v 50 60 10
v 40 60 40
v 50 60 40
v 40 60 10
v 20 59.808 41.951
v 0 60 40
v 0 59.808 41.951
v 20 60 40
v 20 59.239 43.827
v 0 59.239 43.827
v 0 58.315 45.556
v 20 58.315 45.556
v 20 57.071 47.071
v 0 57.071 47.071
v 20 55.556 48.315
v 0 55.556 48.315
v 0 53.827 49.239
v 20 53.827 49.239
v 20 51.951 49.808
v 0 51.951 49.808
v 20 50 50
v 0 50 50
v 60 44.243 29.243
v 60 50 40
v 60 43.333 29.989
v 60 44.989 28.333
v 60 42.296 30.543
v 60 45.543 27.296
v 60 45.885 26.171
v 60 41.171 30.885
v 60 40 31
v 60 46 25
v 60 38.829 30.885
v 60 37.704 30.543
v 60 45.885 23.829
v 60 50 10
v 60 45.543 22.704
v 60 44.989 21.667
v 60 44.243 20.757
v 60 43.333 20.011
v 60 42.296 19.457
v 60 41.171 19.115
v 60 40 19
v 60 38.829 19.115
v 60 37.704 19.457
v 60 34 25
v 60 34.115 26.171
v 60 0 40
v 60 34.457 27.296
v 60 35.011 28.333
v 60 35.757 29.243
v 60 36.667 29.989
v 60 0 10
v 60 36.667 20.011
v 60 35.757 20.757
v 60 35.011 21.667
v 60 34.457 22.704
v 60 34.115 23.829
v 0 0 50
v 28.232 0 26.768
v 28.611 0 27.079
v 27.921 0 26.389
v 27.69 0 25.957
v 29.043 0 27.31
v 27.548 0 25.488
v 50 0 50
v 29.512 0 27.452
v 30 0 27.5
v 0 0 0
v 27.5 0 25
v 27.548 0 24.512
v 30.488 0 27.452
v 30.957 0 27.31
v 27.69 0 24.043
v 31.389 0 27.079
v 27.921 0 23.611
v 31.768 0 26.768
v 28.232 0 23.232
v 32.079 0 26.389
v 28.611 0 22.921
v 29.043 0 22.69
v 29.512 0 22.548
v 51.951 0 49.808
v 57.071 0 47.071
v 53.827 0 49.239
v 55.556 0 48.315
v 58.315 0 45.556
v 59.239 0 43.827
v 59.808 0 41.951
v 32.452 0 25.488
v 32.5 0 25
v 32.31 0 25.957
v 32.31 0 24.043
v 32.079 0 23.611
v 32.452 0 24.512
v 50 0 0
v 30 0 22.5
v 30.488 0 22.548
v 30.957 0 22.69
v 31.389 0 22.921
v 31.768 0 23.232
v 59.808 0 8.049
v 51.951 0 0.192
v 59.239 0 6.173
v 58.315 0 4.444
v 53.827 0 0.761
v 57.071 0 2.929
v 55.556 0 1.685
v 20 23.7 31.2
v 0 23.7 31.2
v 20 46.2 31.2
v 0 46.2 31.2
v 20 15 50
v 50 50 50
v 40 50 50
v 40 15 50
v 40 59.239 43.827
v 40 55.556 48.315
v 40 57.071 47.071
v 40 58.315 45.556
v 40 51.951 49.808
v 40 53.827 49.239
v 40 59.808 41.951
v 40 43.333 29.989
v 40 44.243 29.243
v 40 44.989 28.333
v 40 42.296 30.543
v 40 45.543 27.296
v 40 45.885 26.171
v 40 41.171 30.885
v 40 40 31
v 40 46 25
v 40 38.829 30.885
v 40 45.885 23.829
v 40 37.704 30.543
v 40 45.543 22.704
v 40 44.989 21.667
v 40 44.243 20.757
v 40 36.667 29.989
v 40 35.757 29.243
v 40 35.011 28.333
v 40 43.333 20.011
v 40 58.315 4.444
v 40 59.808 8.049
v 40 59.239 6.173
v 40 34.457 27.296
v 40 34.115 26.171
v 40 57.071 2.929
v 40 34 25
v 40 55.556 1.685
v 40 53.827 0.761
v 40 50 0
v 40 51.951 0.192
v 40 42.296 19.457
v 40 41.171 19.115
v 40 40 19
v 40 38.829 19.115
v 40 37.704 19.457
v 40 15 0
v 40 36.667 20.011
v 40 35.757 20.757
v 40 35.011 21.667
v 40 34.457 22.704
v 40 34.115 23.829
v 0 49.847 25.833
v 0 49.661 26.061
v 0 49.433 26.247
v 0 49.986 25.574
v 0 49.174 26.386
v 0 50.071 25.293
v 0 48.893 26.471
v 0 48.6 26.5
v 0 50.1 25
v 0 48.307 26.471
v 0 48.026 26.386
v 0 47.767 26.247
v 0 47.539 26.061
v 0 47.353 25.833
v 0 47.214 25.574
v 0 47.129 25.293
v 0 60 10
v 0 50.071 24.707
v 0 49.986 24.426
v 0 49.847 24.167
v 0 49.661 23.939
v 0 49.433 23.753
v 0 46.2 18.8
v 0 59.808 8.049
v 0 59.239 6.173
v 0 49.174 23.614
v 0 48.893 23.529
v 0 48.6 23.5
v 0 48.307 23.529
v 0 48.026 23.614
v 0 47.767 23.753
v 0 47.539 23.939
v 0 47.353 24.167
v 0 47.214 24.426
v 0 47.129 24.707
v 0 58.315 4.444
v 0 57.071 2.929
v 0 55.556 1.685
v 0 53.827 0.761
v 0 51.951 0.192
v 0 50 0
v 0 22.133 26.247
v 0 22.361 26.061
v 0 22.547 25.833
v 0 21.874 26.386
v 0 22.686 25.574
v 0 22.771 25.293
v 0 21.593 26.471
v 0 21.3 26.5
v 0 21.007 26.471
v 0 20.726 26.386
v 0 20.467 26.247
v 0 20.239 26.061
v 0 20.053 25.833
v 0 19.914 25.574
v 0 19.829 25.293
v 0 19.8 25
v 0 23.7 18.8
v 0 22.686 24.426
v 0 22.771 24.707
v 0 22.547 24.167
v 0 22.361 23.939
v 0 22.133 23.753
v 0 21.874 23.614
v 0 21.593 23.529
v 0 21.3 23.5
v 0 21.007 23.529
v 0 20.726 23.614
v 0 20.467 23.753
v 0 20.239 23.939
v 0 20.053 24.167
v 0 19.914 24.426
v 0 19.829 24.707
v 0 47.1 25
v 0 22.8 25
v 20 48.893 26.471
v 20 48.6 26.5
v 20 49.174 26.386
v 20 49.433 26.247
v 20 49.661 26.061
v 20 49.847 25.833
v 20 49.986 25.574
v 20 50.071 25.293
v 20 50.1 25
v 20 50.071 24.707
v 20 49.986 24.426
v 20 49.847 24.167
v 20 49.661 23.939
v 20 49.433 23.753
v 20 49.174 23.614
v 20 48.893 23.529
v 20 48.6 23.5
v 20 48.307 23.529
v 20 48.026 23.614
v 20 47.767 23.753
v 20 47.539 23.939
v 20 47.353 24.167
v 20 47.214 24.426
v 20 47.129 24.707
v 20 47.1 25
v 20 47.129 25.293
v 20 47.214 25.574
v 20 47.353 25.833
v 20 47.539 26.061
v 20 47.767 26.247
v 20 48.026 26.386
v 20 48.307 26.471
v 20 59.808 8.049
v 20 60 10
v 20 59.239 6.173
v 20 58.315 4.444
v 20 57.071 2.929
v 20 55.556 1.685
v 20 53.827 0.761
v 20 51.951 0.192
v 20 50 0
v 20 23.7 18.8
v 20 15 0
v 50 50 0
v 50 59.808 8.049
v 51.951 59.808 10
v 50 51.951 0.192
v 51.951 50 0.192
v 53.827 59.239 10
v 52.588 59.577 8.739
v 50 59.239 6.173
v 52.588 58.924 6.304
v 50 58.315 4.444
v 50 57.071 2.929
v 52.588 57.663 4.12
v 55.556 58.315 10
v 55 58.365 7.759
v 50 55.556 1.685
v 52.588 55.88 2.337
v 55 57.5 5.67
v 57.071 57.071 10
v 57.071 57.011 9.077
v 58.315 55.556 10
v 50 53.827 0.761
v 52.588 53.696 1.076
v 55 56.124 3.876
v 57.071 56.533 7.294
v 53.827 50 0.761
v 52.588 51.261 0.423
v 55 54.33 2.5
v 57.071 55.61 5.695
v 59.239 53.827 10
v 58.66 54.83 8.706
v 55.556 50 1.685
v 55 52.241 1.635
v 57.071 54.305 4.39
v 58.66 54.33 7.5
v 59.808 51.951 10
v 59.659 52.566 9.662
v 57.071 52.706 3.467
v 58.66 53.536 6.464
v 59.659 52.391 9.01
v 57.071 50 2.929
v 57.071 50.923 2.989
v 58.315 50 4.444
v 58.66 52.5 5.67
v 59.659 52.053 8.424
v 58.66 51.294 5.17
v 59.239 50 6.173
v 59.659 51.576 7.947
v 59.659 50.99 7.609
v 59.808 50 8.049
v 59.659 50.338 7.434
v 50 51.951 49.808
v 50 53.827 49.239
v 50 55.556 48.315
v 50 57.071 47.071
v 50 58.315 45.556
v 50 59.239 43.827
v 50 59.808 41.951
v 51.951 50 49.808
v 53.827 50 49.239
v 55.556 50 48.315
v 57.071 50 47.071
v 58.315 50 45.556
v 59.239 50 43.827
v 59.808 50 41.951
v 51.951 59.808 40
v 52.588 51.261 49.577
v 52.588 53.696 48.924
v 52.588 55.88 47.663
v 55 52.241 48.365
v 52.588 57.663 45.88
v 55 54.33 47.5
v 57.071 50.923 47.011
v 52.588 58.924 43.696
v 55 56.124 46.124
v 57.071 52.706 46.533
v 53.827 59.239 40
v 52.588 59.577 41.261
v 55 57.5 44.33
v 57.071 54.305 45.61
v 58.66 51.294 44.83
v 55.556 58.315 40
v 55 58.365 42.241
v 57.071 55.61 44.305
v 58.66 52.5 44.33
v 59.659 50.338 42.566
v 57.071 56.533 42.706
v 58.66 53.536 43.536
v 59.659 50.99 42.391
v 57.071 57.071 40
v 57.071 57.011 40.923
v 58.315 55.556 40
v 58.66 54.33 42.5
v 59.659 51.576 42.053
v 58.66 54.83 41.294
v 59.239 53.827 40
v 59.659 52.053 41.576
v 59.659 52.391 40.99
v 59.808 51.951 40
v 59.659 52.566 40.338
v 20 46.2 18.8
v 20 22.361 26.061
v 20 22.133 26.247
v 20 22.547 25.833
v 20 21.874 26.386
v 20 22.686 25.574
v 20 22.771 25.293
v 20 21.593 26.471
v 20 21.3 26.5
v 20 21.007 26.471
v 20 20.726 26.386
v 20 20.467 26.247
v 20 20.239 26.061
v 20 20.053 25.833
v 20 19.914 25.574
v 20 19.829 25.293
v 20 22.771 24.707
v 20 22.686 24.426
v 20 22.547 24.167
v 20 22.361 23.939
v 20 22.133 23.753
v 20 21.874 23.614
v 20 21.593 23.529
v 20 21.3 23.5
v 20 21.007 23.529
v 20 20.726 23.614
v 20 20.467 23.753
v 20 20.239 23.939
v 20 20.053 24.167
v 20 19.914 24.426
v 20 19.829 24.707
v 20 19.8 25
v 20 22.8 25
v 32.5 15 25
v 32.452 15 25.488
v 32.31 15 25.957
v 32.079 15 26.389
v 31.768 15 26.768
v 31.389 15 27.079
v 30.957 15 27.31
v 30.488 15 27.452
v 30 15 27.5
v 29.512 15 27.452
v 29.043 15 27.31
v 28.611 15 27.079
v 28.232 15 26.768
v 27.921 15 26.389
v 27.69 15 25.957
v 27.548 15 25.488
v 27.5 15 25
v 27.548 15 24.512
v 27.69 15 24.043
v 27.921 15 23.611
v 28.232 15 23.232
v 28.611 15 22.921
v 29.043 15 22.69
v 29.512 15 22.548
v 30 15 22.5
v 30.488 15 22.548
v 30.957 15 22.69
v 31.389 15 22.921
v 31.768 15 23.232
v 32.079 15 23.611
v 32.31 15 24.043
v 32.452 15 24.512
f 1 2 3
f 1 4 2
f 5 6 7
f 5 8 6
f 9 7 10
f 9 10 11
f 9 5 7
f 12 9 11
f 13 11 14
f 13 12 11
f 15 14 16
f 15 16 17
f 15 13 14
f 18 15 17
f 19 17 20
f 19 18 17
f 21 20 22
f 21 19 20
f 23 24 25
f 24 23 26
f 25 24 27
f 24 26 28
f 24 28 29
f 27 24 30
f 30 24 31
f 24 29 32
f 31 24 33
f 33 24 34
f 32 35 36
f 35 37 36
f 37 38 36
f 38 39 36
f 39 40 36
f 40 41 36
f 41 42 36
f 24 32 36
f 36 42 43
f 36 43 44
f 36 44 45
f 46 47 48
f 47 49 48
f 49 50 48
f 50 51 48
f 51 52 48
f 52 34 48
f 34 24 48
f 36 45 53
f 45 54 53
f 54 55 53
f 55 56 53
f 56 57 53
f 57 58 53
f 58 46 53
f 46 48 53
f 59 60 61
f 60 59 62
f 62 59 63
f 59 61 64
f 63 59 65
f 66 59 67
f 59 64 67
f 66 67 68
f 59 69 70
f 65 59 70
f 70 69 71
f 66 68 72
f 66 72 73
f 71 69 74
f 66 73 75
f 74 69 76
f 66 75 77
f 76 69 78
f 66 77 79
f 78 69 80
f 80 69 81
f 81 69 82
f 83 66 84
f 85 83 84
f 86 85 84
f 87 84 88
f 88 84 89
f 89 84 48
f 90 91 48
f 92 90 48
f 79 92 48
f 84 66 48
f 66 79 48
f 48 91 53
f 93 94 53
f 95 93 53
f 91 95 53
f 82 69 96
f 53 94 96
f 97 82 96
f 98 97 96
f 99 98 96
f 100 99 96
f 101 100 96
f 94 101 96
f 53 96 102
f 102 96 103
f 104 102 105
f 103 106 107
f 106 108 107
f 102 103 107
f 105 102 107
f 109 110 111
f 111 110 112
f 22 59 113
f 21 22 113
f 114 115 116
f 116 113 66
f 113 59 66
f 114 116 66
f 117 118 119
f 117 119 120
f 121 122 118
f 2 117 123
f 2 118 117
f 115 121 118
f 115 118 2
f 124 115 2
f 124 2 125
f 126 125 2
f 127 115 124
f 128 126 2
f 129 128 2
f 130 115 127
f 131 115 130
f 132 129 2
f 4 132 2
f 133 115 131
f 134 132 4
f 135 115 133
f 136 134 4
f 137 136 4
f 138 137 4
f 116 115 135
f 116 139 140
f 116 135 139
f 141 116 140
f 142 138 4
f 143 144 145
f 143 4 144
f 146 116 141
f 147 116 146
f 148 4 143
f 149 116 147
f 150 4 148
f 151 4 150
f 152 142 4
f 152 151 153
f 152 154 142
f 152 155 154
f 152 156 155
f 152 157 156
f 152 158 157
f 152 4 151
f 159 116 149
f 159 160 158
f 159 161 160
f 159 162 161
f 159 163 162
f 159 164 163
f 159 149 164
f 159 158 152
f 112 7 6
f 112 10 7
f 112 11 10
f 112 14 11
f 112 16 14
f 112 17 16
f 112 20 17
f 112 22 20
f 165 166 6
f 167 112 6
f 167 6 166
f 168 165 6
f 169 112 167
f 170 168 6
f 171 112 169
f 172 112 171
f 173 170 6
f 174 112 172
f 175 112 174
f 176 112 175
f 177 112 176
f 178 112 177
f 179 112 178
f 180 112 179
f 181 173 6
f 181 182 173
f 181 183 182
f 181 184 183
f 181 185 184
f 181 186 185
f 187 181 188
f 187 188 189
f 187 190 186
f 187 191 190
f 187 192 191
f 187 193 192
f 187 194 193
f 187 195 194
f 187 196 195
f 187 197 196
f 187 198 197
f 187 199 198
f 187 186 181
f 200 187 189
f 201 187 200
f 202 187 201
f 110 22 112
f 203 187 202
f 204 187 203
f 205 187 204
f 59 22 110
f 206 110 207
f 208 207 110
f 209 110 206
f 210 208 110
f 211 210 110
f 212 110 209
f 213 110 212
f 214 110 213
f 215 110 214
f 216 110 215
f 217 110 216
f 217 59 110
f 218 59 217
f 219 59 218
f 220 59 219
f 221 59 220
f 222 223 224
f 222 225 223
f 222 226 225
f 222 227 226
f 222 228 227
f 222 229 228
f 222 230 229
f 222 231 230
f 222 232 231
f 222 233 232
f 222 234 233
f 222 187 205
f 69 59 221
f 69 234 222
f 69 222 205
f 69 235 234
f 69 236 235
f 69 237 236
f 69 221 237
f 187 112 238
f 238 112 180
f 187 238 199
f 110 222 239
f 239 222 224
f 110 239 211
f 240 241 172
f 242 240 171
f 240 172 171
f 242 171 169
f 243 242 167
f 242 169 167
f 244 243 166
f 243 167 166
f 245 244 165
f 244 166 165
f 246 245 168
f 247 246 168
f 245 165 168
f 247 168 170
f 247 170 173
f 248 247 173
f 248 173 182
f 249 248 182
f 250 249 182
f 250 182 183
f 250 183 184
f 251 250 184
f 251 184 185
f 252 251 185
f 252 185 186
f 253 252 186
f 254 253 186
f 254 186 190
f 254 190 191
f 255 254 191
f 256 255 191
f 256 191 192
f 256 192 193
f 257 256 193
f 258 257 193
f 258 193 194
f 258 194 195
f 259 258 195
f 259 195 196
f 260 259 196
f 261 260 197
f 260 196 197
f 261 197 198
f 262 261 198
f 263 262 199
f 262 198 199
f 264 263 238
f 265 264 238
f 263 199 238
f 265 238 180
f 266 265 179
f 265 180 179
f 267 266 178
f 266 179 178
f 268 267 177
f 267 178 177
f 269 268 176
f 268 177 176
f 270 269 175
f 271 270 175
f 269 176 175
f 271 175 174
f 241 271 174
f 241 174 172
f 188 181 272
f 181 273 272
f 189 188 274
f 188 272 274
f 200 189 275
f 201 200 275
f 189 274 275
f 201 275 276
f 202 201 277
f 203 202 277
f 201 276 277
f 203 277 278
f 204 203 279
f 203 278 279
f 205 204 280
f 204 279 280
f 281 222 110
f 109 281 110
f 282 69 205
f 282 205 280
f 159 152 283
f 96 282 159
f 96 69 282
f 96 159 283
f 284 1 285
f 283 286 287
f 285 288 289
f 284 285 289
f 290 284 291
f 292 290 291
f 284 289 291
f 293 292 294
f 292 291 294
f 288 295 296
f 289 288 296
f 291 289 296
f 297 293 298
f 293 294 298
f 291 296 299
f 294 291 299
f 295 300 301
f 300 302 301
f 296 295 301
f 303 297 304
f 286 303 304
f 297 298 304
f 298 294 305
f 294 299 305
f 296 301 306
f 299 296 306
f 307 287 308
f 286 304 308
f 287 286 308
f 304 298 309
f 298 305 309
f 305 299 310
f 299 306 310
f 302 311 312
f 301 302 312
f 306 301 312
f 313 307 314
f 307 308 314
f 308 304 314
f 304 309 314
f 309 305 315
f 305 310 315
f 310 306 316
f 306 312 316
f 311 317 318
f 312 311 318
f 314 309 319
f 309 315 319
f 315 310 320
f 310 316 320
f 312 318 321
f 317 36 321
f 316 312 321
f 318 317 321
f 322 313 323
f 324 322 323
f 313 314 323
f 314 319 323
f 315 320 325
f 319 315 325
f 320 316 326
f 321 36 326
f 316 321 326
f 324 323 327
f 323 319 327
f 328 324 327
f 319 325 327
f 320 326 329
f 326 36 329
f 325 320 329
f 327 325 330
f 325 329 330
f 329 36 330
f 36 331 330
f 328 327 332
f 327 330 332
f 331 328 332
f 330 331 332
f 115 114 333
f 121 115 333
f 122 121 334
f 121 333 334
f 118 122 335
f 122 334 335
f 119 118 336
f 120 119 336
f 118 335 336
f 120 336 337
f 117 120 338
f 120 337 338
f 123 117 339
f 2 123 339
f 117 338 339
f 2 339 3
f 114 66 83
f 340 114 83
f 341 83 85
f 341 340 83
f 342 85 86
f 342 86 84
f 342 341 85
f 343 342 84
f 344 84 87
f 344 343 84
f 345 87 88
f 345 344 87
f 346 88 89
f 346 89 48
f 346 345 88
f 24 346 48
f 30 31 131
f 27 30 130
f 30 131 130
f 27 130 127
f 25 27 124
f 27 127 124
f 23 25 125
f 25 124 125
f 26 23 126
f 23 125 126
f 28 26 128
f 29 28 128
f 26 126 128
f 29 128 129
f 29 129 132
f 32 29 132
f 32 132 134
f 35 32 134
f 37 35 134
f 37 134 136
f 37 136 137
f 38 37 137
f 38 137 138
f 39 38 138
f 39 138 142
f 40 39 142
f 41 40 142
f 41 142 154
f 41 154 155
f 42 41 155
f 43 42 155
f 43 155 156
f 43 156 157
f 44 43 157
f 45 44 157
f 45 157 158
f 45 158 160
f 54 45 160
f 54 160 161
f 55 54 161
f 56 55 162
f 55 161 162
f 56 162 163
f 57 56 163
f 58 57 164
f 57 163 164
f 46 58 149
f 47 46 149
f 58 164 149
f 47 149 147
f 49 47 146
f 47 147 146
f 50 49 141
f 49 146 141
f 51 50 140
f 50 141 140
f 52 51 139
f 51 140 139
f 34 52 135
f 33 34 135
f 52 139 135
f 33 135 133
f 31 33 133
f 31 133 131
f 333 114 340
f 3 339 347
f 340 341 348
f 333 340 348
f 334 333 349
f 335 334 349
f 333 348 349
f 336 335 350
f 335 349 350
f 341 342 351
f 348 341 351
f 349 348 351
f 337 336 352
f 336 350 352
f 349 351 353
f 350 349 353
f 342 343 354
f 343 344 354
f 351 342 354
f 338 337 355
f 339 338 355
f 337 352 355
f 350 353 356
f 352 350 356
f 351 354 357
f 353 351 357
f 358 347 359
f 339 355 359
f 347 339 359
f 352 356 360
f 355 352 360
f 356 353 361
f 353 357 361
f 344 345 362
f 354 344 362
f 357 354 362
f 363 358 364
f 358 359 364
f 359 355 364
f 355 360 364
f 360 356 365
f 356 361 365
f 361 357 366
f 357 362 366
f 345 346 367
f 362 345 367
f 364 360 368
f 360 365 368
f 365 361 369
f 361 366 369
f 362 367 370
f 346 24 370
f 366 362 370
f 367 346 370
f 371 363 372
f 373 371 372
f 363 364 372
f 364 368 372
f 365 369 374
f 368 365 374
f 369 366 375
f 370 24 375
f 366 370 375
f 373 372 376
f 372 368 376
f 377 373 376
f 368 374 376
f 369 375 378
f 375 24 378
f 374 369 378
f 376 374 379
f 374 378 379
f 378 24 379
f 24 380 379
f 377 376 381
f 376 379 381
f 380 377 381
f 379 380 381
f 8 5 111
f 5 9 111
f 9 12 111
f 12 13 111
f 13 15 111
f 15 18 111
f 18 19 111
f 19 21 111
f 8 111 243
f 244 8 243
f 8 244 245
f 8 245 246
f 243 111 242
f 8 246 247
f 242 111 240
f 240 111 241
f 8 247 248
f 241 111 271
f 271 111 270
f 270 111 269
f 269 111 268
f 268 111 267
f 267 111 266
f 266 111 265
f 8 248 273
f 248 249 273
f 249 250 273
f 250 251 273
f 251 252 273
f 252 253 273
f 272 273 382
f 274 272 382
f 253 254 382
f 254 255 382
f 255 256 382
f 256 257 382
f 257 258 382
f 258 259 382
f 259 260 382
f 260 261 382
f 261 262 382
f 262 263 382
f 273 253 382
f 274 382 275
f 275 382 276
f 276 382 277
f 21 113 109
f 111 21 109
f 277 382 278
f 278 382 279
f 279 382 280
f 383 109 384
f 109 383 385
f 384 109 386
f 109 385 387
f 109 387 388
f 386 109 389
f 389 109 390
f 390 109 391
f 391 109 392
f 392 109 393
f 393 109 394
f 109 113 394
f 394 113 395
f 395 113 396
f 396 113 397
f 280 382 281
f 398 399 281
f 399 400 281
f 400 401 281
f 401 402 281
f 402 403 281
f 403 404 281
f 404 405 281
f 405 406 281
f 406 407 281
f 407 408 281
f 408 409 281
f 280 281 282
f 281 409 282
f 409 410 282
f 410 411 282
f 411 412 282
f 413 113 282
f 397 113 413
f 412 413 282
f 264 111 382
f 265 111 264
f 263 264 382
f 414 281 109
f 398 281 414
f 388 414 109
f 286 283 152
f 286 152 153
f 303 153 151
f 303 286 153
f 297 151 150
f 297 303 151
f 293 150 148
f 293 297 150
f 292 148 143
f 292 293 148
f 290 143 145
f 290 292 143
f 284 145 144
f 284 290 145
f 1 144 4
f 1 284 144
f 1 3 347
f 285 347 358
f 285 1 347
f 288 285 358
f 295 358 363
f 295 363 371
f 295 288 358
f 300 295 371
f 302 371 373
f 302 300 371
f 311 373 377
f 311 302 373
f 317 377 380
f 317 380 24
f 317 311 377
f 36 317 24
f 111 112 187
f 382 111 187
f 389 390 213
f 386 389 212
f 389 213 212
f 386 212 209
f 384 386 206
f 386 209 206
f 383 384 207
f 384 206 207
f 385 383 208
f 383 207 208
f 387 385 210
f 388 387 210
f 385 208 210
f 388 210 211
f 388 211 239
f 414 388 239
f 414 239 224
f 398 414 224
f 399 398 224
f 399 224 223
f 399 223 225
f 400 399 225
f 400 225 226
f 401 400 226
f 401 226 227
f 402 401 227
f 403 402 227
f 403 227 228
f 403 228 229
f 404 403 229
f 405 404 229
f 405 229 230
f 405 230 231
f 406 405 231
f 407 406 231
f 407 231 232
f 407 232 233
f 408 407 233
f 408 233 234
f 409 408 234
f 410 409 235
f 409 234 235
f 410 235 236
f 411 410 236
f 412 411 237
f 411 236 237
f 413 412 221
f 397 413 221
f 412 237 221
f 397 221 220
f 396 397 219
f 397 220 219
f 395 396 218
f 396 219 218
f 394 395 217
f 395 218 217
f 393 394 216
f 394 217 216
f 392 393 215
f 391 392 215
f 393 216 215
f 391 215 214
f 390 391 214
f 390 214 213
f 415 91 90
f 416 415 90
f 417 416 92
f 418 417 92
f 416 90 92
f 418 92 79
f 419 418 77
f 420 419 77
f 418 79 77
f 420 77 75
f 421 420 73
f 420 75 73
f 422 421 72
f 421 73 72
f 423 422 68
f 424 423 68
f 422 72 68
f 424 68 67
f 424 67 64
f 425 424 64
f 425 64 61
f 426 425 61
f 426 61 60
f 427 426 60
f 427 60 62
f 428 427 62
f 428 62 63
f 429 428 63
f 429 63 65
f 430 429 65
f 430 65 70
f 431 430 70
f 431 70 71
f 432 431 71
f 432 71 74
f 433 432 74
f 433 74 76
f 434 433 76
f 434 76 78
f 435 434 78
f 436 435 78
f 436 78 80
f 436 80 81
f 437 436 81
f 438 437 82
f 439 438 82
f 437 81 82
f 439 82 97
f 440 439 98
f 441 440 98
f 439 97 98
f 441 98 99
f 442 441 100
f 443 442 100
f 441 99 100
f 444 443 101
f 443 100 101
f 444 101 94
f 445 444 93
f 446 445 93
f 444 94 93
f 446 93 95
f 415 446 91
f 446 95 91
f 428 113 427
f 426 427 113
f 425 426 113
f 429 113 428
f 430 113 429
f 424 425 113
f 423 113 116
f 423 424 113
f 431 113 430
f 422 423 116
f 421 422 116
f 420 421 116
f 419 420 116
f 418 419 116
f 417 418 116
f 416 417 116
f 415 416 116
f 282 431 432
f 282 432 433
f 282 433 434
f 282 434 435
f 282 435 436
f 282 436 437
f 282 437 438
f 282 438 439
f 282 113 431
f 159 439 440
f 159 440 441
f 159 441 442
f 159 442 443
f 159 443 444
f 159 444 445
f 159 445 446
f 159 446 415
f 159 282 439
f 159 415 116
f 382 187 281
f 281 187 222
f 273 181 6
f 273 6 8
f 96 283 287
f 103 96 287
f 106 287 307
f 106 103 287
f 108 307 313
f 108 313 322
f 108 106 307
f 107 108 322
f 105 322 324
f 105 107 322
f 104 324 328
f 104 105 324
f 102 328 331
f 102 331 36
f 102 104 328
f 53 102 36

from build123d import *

# Parameters (mm, degrees)
SKETCH1_W           = 60
SKETCH1_H           = 50
BOSS_EXTRUDE1_DEPTH = 15
SKETCH5_W           = 20
SKETCH5_H           = 50
BOSS_EXTRUDE5_DEPTH = 45
SKETCH6_R           = 6
CUT_EXTRUDE1_DEPTH  = 84
SKETCH7_R           = 2.5
CUT_EXTRUDE2_DEPTH  = 19
FILLET1_R           = 10
FILLET3_R           = 10
SKETCH8_R           = 6
SKETCH8_R_2         = 1.5
CUT_EXTRUDE3_DEPTH  = 30


with BuildPart() as part:
    # Sketch1 → Boss-Extrude1 (new body)
    with BuildSketch(Plane(origin=(0, 0, 0), x_dir=(1, 0, 0), z_dir=(0, 1, 0))):
        with Locations((30, -25)):
            Rectangle(SKETCH1_W, SKETCH1_H)
    extrude(amount=BOSS_EXTRUDE1_DEPTH)

    # Sketch5 → Boss-Extrude5 (add)
    with BuildSketch(Plane(origin=(0, 15, 0), x_dir=(1, 0, 0), z_dir=(0, 1, 0))):
        with Locations((10, -25)):
            Rectangle(SKETCH5_W, SKETCH5_H)
        with Locations((50, -25)):
            Rectangle(SKETCH5_W, SKETCH5_H)
    extrude(amount=BOSS_EXTRUDE5_DEPTH)

    # Sketch6 → Cut-Extrude1 (cut)
    with BuildSketch(Plane.ZY):
        with Locations((25, 40)):
            Circle(SKETCH6_R)
    extrude(amount=-CUT_EXTRUDE1_DEPTH, mode=Mode.SUBTRACT)

    # Sketch7 → Cut-Extrude2 (cut)
    with BuildSketch(Plane.XZ):
        with Locations((30, 25)):
            Circle(SKETCH7_R)
    extrude(amount=-CUT_EXTRUDE2_DEPTH, mode=Mode.SUBTRACT)

    # Fillet1
    fillet1_edges = [part.edges().sort_by_distance(p)[0] for p in [
        (10, 60, 50),
        (10, 60, 0),
        (50, 60, 0),
        (50, 60, 50),
    ]]
    fillet(fillet1_edges, radius=FILLET1_R)

    # Fillet3
    fillet3_edges = [part.edges().sort_by_distance(p)[0] for p in [
        (60, 25, 50),
        (60, 60, 25),
        (60, 25, 0),
        (60, 57.071067812, 2.928932188),
        (60, 57.071067812, 47.071067812),
    ]]
    fillet(fillet3_edges, radius=FILLET3_R)

    # Sketch8 → Cut-Extrude3 (cut)
    with BuildSketch(Plane.ZY):
        Polygon((31.2, 46.2), (25, 46.2), (18.8, 46.2), (18.8, 23.7), (25, 23.7), (31.2, 23.7), align=None)
        with Locations((25, 40)):
            Circle(SKETCH8_R, mode=Mode.SUBTRACT)
        with Locations((25, 48.6)):
            Circle(SKETCH8_R_2)
        with Locations((25, 21.3)):
            Circle(SKETCH8_R_2)
    extrude(amount=-CUT_EXTRUDE3_DEPTH, mode=Mode.SUBTRACT)


solid = part.part
